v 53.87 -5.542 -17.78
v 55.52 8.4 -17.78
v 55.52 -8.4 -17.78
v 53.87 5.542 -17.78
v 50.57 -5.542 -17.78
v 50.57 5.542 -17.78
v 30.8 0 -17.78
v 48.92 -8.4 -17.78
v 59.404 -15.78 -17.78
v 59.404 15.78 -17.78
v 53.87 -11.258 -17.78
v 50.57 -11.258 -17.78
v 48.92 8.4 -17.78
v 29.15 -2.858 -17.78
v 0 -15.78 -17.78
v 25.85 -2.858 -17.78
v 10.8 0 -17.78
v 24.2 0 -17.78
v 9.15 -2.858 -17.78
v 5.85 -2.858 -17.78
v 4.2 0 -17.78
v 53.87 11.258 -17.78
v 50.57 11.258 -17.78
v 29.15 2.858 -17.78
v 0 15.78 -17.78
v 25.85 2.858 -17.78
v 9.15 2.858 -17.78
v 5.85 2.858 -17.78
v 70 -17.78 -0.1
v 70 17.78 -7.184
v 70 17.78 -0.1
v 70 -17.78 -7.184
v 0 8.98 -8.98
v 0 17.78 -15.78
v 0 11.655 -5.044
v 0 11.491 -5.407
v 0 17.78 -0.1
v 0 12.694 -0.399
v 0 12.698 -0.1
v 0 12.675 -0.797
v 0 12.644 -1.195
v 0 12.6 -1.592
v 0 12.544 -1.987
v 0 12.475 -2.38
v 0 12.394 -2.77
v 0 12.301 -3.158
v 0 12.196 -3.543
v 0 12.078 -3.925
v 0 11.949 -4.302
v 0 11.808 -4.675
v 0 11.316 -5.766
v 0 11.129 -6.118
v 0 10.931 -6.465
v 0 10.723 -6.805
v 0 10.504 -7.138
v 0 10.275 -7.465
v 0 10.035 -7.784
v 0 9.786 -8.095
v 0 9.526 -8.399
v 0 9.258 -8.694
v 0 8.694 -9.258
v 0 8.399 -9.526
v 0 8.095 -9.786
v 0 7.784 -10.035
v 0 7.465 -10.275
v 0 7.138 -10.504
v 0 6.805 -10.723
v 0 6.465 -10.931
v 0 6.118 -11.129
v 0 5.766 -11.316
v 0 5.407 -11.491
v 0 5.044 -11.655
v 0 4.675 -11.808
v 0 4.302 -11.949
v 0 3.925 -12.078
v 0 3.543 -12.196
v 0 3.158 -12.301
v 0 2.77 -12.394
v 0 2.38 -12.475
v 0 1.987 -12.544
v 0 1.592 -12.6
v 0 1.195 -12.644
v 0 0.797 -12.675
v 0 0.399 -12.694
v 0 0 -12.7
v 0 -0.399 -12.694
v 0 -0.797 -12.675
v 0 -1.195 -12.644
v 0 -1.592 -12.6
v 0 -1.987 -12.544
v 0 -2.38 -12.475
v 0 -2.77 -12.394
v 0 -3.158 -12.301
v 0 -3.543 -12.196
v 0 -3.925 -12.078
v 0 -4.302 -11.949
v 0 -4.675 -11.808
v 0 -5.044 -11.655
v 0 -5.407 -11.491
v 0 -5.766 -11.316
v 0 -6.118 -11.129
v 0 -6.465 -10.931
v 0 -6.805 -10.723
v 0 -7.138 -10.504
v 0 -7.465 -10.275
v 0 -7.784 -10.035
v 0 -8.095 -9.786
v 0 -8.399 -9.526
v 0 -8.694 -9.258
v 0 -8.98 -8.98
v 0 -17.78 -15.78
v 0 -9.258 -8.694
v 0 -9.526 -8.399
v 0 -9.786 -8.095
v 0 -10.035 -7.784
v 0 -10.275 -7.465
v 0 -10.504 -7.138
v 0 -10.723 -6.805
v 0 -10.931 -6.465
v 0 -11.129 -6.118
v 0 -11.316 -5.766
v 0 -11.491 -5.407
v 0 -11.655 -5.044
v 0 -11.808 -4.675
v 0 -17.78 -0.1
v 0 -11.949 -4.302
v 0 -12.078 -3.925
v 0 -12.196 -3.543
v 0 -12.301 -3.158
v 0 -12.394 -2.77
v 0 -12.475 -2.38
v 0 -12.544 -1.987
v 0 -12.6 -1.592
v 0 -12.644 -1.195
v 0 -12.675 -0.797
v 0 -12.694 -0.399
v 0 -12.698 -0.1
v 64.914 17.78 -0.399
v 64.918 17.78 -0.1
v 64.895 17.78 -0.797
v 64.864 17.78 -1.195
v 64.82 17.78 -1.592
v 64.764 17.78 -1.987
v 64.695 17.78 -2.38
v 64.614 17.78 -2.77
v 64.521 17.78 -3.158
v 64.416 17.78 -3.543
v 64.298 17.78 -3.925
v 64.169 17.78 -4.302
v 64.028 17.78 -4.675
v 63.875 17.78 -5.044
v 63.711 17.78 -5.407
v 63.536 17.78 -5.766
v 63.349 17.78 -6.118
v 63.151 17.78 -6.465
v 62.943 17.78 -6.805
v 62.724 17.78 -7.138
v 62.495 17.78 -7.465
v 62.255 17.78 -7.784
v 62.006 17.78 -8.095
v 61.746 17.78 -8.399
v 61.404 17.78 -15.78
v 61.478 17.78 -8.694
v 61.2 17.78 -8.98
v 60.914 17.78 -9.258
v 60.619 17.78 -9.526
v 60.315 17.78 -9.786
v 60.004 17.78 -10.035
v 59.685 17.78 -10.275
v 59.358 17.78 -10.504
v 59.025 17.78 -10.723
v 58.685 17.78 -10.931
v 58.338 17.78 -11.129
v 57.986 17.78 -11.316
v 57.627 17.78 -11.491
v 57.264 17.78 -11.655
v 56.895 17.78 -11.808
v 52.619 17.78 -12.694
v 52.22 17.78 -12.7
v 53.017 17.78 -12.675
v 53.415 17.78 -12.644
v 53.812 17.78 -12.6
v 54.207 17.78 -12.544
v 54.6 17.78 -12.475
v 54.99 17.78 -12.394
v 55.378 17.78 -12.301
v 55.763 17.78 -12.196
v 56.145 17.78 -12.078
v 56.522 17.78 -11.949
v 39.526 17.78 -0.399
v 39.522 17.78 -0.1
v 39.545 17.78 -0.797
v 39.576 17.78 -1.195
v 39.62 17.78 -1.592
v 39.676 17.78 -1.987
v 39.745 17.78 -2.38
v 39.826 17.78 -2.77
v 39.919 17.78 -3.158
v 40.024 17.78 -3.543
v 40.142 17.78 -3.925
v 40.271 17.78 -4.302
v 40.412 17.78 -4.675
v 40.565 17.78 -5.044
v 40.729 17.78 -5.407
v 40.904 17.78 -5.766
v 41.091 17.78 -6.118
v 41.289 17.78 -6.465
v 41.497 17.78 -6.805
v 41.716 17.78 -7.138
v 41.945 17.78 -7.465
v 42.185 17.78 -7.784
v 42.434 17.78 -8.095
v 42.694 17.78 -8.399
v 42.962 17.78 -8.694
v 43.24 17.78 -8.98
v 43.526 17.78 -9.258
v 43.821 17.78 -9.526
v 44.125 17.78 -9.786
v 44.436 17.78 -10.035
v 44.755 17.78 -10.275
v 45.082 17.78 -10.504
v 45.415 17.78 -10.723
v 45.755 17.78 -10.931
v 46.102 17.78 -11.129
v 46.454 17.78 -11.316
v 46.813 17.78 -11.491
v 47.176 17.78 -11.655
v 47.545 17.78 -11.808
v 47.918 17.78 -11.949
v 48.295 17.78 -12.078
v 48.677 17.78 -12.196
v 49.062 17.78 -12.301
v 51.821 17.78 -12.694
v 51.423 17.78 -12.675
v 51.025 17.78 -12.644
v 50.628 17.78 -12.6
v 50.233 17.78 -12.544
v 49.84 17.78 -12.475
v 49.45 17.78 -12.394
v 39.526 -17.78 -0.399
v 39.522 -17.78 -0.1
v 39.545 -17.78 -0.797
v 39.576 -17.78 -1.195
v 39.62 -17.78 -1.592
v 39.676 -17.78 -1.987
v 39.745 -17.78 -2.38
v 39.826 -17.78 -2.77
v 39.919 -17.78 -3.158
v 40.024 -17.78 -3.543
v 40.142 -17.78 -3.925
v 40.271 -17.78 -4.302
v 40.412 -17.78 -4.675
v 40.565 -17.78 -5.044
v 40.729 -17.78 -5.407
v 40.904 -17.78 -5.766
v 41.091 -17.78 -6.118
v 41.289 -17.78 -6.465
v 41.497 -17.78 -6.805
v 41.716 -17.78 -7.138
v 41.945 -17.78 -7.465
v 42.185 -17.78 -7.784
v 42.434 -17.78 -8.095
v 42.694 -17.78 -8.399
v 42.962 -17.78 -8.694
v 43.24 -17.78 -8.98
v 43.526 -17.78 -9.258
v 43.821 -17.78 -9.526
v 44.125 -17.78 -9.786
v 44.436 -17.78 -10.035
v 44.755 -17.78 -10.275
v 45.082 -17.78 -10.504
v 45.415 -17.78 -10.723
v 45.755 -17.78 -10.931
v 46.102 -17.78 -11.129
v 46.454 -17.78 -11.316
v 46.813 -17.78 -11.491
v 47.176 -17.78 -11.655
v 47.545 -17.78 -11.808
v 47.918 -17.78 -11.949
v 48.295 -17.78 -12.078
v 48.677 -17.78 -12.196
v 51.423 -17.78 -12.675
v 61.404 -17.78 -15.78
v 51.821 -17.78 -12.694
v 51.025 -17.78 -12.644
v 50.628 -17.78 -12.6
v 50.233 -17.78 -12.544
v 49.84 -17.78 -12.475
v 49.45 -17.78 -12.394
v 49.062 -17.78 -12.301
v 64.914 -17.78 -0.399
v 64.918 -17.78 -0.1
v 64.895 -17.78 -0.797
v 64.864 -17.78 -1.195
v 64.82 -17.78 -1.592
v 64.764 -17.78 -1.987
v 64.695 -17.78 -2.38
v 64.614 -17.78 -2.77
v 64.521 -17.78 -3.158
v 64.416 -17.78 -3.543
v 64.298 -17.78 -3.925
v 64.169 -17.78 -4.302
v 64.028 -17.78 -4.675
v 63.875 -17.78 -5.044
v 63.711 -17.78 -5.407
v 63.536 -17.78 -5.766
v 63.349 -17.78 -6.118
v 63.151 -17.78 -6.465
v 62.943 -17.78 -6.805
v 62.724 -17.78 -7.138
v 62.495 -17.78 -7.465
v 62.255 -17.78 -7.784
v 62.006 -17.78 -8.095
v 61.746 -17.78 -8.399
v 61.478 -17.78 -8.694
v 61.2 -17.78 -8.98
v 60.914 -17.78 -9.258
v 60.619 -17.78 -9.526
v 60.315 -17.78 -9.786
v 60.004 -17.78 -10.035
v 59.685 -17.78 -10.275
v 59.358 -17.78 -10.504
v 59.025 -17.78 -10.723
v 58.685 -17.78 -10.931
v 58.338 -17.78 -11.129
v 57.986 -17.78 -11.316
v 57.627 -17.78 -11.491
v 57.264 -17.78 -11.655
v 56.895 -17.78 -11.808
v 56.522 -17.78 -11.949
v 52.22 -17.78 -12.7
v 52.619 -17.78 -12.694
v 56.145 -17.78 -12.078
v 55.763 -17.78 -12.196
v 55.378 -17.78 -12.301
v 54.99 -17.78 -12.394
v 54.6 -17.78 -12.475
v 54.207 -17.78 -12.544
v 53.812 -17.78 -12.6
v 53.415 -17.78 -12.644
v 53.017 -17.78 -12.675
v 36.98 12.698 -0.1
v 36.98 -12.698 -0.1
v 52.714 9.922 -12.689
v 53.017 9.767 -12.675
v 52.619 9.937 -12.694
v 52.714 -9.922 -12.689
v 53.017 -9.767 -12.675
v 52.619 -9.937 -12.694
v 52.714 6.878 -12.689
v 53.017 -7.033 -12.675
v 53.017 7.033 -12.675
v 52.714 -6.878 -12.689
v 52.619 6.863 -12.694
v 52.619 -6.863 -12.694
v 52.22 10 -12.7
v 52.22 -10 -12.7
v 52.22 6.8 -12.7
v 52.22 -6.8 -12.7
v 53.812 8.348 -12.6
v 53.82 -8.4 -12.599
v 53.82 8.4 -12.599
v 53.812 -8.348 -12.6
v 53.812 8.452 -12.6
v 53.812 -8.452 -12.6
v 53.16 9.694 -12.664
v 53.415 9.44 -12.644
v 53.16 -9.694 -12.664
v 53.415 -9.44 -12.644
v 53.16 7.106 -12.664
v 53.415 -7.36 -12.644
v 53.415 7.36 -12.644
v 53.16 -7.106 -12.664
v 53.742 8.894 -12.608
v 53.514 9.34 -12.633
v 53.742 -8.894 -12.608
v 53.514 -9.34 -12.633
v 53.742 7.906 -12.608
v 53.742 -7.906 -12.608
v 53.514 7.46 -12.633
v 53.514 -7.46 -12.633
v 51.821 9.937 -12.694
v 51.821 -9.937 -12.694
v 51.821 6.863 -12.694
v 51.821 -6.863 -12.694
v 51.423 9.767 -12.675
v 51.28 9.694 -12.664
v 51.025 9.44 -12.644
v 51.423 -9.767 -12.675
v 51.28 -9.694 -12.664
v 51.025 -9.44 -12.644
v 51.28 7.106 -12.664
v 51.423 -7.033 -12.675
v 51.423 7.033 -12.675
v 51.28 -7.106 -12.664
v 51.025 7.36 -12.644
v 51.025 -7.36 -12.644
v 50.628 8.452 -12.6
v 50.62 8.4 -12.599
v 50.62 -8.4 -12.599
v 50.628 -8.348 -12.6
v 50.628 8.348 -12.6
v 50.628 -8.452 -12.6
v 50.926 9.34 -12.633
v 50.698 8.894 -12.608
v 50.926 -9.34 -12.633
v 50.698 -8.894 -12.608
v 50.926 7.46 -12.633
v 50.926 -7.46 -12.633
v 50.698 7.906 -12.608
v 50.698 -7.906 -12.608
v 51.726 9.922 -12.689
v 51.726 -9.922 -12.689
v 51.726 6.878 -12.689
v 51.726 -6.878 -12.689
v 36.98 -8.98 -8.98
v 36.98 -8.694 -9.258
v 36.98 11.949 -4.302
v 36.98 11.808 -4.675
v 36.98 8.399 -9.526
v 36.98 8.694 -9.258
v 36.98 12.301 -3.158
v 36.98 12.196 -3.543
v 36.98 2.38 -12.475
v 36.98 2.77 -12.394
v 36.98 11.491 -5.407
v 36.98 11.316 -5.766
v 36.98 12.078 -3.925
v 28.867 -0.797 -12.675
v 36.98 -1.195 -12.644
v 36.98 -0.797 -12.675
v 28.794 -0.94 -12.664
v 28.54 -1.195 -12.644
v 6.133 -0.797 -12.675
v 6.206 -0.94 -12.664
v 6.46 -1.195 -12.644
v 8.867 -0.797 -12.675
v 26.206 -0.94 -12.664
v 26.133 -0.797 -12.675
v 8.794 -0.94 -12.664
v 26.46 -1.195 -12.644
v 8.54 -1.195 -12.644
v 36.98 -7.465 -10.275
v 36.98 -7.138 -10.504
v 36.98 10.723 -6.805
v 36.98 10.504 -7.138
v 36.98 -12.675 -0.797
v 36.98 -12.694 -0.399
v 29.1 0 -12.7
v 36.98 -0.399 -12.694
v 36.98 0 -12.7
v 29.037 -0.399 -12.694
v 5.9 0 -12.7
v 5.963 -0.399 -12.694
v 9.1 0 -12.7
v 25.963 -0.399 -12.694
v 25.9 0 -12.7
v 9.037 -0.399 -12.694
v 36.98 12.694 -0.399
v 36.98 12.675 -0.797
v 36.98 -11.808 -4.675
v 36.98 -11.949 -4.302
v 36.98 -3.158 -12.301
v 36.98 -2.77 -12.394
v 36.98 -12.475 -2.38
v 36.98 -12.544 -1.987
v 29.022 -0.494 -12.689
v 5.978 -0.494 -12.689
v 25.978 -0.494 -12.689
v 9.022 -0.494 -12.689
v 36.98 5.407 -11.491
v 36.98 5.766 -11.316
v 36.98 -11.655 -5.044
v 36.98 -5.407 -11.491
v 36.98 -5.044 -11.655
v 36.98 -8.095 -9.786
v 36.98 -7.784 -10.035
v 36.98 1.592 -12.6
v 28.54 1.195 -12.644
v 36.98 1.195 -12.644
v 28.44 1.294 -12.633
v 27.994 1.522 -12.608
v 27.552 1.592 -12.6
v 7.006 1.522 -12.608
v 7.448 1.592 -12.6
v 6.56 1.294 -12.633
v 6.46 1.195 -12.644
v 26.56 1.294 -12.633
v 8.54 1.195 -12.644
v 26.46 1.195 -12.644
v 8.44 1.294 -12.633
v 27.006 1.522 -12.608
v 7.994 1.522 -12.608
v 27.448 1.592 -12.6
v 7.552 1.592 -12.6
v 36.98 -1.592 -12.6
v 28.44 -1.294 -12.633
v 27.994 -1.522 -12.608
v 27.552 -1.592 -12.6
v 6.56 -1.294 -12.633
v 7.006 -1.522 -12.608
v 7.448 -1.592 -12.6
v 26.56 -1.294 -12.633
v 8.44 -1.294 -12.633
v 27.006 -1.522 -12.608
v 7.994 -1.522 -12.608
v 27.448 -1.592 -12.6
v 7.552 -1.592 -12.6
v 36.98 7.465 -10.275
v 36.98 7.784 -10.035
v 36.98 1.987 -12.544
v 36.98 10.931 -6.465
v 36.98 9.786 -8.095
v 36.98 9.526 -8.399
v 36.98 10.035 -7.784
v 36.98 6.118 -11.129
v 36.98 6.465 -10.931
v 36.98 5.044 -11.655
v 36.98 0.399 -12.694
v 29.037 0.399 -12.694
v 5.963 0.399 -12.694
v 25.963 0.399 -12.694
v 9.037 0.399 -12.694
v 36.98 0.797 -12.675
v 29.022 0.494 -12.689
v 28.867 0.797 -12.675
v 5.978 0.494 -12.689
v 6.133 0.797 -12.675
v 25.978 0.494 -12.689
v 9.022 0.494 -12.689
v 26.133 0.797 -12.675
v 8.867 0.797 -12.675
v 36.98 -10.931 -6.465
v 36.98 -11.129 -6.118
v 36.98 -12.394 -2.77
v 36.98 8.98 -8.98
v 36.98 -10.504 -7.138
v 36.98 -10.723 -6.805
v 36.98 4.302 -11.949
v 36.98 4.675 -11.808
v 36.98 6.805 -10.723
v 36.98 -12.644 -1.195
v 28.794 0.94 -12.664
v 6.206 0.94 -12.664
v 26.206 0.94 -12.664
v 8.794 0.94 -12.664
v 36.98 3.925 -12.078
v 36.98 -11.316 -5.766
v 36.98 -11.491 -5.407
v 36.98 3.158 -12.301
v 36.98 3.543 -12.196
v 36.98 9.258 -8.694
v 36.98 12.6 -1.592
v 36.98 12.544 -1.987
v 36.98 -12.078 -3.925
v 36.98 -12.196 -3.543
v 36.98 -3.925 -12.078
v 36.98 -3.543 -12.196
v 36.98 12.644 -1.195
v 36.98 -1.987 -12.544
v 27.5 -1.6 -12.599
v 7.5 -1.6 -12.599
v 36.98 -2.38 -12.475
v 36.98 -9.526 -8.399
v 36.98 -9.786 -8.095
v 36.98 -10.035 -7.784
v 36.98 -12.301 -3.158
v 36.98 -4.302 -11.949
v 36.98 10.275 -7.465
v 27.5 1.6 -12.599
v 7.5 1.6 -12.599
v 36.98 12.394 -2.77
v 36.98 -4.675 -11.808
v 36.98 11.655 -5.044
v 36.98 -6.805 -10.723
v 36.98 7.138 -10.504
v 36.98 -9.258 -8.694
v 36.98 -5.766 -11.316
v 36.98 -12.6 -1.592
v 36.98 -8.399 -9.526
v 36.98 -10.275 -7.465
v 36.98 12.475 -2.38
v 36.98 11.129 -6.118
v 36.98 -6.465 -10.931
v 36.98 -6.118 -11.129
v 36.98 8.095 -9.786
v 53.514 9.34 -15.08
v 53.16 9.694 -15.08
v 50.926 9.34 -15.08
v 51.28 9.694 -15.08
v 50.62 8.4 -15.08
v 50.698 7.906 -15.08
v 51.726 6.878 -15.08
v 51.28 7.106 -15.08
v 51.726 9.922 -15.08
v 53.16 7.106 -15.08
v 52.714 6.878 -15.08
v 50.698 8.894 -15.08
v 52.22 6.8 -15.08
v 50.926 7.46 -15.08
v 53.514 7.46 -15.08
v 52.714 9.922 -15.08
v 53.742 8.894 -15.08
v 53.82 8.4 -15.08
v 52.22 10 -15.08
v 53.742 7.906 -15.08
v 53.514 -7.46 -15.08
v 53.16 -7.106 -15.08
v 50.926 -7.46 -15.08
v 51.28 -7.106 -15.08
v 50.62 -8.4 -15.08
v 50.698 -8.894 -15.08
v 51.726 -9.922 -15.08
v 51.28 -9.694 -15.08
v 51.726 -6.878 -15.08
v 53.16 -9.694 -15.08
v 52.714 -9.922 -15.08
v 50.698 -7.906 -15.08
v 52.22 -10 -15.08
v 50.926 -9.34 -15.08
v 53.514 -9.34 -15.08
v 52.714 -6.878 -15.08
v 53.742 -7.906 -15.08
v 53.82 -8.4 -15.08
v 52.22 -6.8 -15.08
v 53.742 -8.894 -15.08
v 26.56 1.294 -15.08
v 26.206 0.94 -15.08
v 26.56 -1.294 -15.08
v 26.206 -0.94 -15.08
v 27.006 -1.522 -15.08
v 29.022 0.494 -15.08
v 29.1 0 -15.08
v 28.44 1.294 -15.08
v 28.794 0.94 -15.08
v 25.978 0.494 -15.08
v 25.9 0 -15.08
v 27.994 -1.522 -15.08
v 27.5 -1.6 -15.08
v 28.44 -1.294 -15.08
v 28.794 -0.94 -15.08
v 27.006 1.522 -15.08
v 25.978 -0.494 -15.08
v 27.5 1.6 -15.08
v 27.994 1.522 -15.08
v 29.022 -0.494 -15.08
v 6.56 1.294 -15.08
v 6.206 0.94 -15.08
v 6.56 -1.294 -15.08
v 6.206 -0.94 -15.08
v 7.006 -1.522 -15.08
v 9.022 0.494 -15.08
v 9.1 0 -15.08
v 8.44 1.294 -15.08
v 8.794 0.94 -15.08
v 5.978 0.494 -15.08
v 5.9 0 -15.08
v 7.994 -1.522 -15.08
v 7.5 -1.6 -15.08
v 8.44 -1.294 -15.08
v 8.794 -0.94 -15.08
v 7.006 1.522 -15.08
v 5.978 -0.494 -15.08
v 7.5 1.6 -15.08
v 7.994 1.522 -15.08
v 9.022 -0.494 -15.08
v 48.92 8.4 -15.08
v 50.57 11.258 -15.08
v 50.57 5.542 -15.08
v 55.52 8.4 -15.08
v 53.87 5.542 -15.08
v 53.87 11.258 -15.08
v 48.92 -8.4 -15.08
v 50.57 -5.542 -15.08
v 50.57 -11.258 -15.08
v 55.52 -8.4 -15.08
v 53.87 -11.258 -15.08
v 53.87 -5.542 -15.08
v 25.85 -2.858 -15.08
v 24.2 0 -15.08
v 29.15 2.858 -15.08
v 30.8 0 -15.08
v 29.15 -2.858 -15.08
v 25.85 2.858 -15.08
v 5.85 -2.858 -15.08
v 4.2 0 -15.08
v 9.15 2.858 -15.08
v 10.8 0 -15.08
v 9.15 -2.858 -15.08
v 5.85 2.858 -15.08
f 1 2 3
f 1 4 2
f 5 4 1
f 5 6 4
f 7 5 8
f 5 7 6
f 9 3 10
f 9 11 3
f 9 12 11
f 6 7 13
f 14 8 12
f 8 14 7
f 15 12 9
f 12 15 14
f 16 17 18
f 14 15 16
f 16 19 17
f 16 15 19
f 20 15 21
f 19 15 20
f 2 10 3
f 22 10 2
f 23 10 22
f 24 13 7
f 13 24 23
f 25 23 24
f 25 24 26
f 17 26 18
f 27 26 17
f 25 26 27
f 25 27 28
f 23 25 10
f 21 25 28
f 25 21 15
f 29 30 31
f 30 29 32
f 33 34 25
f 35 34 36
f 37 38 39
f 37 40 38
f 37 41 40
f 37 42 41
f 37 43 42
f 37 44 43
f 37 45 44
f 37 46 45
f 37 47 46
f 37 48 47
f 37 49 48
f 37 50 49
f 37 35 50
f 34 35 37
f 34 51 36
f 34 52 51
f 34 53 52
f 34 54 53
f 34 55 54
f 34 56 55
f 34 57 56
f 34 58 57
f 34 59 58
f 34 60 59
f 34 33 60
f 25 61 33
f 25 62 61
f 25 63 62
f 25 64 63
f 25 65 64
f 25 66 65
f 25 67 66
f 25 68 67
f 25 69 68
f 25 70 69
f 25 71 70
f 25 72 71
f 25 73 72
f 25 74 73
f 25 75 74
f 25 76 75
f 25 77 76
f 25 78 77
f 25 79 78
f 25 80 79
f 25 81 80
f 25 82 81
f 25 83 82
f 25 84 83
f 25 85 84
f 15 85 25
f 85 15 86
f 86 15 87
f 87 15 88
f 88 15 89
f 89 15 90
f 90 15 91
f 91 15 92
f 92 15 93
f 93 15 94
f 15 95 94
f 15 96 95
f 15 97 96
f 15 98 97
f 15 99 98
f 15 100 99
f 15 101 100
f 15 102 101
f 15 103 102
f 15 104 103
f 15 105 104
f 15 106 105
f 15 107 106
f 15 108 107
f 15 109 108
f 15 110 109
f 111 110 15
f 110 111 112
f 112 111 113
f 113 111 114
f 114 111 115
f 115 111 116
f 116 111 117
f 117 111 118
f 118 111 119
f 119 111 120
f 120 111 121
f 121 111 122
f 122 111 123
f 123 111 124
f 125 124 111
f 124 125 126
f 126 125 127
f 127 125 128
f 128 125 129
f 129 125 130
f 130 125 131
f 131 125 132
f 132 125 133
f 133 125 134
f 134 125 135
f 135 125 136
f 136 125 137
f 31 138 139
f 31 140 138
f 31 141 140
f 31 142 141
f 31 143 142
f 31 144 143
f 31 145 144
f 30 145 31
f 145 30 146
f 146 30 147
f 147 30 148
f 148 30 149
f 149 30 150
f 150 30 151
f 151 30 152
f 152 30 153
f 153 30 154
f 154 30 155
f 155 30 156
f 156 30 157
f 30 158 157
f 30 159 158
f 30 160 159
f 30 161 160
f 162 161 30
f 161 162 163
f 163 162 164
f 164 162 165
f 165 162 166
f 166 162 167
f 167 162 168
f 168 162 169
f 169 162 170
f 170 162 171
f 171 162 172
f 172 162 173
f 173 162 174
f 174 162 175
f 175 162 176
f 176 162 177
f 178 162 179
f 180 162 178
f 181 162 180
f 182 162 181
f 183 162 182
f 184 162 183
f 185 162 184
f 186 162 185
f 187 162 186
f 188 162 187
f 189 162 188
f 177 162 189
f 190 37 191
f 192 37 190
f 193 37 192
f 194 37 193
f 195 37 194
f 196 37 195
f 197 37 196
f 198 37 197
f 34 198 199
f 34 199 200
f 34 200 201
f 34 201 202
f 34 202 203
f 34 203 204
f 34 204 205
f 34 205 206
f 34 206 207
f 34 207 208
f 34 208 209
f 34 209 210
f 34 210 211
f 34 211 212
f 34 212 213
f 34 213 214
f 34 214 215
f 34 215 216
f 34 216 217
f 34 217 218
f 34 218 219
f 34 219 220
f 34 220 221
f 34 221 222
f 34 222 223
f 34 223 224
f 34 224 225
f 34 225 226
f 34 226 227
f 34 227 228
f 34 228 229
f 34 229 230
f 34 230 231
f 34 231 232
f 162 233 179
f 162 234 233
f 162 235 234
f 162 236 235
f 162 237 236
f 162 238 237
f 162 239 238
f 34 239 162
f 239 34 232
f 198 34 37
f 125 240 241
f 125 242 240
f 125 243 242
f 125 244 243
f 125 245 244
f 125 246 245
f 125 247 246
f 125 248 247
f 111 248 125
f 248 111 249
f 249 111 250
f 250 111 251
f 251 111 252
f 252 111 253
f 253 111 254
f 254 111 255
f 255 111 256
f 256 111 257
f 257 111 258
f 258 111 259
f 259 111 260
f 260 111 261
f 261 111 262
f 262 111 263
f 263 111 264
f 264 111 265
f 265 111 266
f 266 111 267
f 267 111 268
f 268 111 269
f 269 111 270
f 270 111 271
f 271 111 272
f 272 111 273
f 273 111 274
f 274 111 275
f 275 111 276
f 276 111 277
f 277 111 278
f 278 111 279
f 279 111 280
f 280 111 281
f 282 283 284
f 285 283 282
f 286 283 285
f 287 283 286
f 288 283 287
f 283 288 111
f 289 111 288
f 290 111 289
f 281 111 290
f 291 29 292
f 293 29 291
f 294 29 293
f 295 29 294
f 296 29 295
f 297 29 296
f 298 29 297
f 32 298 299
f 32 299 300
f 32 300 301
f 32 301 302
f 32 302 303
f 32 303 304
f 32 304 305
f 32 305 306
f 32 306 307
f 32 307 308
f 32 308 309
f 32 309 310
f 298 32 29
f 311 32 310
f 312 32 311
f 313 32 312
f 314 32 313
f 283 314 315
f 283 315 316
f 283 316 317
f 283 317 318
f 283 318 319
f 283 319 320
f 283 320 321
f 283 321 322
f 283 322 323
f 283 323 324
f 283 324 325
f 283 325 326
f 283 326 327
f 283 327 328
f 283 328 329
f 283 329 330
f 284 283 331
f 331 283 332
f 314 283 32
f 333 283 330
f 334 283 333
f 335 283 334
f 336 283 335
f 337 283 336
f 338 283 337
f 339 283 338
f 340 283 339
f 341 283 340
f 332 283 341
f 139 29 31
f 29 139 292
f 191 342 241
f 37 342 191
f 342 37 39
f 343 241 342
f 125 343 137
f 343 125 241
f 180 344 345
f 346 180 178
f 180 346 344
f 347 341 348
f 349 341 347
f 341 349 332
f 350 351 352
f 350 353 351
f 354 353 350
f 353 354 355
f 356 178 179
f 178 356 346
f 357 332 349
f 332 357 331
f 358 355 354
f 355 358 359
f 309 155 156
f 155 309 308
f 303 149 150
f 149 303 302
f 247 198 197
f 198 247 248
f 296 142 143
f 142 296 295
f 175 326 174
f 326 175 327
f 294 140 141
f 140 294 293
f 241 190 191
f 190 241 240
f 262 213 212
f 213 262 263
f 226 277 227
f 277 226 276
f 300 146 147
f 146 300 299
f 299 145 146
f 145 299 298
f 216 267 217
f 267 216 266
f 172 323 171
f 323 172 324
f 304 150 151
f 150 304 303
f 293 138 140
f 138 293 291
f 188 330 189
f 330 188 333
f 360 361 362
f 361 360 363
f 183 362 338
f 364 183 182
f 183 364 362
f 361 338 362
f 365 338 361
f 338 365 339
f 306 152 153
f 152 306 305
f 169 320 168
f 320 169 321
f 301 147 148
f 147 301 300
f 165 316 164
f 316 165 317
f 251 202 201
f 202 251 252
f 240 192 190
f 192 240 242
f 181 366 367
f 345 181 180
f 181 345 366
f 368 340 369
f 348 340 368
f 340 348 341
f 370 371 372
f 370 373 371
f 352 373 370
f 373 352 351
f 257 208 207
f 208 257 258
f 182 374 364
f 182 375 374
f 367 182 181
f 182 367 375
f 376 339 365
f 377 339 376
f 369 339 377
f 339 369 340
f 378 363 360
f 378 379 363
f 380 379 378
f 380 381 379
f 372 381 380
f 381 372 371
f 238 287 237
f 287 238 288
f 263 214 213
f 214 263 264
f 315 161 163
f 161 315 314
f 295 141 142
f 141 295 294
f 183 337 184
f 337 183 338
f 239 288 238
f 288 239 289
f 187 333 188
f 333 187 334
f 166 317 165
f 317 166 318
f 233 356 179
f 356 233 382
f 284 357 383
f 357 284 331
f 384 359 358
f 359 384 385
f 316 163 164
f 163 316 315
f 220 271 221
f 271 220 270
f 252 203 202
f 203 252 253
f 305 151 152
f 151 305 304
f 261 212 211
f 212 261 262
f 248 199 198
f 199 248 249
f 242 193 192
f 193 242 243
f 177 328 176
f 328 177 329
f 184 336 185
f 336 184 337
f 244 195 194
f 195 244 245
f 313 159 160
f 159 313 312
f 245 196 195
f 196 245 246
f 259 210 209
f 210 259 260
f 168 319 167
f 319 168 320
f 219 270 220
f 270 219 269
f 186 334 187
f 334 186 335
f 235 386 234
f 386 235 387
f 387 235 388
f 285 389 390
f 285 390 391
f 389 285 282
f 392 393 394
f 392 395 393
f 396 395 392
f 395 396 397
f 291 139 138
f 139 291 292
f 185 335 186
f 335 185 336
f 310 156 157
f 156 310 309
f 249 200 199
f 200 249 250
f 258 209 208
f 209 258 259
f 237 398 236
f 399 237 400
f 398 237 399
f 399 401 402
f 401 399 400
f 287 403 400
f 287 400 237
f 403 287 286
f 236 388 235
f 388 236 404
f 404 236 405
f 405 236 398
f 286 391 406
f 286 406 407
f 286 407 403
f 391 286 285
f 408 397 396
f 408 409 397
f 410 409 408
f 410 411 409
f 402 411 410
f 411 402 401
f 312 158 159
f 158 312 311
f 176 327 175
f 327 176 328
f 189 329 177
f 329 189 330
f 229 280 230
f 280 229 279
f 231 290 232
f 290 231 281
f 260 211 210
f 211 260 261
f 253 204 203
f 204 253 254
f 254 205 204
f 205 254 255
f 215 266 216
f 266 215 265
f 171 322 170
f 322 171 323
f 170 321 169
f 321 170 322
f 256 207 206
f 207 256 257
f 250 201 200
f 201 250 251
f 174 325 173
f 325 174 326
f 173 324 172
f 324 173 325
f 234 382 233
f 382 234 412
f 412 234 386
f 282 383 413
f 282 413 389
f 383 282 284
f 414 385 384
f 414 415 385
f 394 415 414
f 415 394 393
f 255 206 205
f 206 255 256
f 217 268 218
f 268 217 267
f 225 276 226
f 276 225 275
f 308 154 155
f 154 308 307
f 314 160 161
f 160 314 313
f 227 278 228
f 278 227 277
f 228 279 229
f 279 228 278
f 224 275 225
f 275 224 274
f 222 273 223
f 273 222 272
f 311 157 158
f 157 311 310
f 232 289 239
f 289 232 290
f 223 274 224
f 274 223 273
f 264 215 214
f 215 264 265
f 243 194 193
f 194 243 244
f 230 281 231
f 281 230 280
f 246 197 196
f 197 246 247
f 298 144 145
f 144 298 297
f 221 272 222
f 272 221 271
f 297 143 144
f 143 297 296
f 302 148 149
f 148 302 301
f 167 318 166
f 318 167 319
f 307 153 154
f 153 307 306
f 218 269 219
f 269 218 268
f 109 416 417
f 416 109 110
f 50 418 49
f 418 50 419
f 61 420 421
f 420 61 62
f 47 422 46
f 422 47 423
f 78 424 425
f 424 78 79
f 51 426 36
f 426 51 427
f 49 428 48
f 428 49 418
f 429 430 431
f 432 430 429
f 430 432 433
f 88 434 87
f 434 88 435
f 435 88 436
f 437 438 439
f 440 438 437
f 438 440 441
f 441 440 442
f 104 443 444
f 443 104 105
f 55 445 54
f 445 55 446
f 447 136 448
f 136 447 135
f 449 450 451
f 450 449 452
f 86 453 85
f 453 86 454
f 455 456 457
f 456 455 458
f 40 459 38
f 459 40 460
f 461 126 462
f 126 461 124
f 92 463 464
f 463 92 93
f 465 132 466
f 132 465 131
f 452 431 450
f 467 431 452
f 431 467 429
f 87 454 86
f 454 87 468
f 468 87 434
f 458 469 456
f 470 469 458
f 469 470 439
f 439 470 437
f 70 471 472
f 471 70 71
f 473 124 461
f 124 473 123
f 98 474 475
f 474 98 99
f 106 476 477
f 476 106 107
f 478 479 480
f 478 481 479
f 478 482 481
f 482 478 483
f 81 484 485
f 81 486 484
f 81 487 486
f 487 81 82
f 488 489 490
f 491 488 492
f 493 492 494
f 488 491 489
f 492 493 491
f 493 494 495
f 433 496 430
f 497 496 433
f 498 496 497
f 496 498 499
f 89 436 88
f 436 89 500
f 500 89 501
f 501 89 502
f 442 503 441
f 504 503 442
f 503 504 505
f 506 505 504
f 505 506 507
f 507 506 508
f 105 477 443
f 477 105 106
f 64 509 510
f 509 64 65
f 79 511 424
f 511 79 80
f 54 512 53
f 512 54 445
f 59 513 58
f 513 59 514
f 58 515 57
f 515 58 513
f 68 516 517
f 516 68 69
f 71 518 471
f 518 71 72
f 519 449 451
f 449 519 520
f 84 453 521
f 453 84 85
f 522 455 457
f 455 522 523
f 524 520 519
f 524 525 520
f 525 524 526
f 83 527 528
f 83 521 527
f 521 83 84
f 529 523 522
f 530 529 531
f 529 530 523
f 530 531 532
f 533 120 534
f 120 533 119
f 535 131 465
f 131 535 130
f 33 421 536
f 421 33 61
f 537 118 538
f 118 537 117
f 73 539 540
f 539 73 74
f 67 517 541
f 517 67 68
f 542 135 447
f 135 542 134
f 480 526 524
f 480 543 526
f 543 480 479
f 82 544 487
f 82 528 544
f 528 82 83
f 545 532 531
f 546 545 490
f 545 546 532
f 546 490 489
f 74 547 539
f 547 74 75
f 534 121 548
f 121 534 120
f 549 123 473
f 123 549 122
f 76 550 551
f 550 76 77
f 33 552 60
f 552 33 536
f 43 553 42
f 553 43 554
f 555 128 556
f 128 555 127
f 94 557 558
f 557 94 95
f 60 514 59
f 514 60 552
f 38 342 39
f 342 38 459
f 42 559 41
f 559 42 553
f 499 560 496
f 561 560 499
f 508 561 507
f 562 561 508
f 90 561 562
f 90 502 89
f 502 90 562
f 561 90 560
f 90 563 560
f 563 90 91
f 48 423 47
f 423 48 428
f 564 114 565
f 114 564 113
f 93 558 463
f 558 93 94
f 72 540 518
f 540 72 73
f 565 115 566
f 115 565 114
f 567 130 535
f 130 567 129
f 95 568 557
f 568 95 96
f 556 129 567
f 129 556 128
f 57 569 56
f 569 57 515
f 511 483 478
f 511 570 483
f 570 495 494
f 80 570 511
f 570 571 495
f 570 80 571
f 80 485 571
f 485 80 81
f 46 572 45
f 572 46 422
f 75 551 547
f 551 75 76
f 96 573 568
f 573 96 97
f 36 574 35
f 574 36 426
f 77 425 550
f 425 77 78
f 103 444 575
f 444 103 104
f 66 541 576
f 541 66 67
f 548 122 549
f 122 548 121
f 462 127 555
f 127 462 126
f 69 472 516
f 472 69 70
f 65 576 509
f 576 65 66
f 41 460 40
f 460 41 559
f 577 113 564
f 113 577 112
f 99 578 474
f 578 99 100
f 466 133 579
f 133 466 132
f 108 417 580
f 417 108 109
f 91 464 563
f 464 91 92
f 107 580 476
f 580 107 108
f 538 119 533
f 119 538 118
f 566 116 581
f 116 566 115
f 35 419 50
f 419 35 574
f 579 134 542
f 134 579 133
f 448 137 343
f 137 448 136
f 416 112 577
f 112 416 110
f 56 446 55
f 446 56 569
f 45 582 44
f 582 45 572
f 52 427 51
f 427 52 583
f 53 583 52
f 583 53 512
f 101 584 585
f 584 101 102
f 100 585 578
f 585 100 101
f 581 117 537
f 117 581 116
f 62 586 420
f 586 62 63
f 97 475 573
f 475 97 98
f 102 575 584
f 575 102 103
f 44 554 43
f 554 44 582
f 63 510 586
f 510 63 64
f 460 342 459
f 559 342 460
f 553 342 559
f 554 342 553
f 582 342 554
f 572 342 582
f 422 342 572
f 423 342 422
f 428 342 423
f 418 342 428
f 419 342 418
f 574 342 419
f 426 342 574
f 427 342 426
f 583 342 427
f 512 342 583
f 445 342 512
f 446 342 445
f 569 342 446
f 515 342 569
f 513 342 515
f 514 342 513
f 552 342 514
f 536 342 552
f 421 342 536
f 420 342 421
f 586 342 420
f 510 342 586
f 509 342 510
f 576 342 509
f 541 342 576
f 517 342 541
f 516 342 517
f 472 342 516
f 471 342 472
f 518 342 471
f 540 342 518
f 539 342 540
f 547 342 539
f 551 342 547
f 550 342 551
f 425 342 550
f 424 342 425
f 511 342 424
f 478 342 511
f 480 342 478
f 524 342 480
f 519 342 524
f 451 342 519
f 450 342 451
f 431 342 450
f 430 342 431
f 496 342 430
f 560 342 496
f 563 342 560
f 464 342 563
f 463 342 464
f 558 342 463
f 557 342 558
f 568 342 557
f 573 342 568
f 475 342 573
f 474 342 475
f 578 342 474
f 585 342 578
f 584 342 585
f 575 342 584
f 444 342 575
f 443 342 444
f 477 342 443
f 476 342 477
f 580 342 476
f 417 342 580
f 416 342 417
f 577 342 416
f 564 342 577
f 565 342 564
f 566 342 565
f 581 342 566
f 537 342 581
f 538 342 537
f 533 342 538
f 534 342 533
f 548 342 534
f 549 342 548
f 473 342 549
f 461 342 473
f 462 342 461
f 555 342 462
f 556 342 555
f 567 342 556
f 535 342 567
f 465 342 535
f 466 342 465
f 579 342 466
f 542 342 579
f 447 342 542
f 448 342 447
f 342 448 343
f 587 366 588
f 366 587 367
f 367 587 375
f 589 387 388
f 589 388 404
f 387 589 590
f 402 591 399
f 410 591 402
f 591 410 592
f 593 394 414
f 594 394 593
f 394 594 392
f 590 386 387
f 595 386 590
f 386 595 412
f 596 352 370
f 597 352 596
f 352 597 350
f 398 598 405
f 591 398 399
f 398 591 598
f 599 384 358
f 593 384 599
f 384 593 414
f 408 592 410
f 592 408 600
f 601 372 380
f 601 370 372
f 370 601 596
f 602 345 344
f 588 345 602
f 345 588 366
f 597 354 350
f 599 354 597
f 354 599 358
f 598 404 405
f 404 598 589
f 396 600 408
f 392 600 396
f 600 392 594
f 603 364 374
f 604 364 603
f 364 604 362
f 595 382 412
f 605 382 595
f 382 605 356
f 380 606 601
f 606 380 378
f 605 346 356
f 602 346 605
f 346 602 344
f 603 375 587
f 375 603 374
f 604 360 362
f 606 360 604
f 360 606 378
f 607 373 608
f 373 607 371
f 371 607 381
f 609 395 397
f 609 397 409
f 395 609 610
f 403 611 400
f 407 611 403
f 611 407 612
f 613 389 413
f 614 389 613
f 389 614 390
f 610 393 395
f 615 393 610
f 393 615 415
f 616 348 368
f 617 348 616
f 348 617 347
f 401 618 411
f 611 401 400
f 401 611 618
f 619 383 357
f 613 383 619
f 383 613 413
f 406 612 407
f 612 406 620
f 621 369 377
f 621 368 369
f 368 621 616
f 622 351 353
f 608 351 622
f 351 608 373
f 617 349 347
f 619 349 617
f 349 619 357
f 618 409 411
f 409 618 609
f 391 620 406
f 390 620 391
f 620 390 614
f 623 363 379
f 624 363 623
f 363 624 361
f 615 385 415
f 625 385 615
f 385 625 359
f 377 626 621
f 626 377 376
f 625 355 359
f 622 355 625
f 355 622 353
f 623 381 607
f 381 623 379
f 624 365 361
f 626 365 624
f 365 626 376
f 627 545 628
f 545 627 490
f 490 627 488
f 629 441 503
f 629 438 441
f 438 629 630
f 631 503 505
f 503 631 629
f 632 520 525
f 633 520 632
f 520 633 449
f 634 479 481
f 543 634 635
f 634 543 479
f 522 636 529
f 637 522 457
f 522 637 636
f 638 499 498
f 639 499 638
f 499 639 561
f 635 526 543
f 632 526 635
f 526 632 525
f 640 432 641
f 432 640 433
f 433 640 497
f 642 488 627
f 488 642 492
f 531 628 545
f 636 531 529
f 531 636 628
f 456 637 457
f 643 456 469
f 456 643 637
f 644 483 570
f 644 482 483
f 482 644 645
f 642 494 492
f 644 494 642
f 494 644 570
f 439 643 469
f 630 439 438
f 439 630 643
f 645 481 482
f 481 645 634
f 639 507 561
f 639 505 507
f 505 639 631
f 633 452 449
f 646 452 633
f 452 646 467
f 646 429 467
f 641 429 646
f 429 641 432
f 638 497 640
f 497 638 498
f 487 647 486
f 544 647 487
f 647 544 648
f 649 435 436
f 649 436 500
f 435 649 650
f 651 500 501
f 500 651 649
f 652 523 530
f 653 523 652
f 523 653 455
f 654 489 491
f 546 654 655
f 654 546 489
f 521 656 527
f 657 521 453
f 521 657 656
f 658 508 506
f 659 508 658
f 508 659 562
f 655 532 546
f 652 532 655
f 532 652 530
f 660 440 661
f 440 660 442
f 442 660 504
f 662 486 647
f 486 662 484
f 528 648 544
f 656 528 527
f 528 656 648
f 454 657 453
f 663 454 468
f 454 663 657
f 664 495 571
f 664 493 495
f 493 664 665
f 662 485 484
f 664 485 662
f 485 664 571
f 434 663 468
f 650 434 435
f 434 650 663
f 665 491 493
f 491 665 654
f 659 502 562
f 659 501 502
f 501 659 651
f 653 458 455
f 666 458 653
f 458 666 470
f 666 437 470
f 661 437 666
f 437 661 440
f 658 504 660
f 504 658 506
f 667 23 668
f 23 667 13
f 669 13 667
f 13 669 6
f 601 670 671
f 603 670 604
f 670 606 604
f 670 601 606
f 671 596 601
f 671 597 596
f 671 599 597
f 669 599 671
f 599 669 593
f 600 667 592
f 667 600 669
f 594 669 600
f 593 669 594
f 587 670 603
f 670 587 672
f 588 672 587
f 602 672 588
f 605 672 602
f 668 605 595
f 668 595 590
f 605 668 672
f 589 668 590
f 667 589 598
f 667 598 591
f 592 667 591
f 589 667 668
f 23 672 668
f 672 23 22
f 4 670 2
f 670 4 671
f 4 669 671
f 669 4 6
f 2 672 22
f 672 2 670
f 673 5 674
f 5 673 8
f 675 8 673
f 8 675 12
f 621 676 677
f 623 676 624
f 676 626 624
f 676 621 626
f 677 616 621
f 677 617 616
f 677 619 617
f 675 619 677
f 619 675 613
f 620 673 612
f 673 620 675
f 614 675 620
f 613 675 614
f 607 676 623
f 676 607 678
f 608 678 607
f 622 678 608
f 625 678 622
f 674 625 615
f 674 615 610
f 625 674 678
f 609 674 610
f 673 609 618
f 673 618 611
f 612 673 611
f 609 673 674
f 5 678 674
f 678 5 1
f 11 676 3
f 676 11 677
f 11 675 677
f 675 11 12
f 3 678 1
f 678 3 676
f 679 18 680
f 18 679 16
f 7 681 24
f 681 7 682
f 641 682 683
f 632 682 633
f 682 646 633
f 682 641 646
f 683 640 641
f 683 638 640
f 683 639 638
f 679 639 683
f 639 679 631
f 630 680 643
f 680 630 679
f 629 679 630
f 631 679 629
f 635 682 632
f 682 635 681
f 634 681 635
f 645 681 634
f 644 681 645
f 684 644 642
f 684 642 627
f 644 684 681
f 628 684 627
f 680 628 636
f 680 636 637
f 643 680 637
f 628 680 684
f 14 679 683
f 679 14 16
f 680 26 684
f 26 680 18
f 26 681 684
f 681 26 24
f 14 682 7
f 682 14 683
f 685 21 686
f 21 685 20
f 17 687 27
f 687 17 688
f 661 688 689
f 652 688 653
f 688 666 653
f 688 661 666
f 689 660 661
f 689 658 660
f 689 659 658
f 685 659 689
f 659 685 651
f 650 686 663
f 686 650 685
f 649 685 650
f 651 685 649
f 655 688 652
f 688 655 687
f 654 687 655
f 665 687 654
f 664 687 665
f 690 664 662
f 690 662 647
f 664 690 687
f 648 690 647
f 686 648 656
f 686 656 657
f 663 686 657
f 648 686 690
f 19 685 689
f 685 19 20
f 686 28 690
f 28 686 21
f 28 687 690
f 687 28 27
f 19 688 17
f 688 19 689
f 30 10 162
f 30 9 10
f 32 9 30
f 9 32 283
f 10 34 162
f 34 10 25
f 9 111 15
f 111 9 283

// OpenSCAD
// file: ../666_1017.scad
//improving rendering speed.
draft = true;   // sets rendering quality to draft.
$fs = draft ? 5 : 0.5;
$fa = 10;

module 666_1017(draft) {

width=main_tube_outer_diameter+2*coupling_wall_thickness;
depth=width;
height= 70; //main_tube_outer_diameter*1.8+main_tube_outer_diameter+wall_thickness;


difference () {
	translate([-(width/2),-(width/2),0])
	   cube ([width,depth,height]);

    //middle cut
    translate ([-0.1,-depth/2 - global_clearance/2,- global_clearance/2])
        cube ([0.2,depth + global_clearance,height + global_clearance]);

	//main tube
	translate([0,main_tube_outer_diameter/2 + coupling_wall_thickness + global_clearance/2, height - main_tube_outer_diameter/2 - coupling_wall_thickness])   
        rotate([90,0,0])
            cylinder(h = depth + global_clearance, r = main_tube_outer_diameter/2, $fn = draft ? 100 : 200);

    //vertical tube
    translate ([0,0, - thickness_between_tubes])
        cylinder(h = height - coupling_wall_thickness - main_tube_outer_diameter,r = main_tube_outer_diameter/2, $fn = draft ? 100 : 200);

   			

   	//screws
   	translate ([- width/2 - global_clearance/2,10 - M3_screw_diameter/2,height - coupling_wall_thickness - main_tube_outer_diameter/2])
   	    rotate ([0,90,0])
            cylinder (h = width + global_clearance, r = M3_screw_diameter/2, $fn = draft ? 10 : 20);

 	translate([- width/2 - global_clearance/2,- 10 + M3_screw_diameter/2,height - coupling_wall_thickness - main_tube_outer_diameter/2])
     	rotate([0,90,0])
            cylinder(h = width + global_clearance, r = M3_screw_diameter/2, $fn = draft ? 10 : 20);

 	translate([- width/2 - global_clearance/2,0,27.5])
        rotate([0,90,0])
            cylinder(h = width + global_clearance, r = M3_screw_diameter/2, $fn = draft ? 10 : 20);

 	translate([- width/2 - global_clearance/2,0,7.5])
        rotate([0,90,0])
            cylinder(h = width + global_clearance, r = M3_screw_diameter/2, $fn = draft ? 10 : 20);

 	//nut
 	translate ([- width/2 - global_clearance,10 - M3_screw_diameter/2,height- coupling_wall_thickness - main_tube_outer_diameter/2])
   	    rotate ([0,90,0])
            cylinder (h = Nut_height_M3 + global_clearance, r = Nut_diameter_M3/2, $fn = 6);
	
	translate([- width/2 - global_clearance,- 10 + M3_screw_diameter/2,height- coupling_wall_thickness - main_tube_outer_diameter/2])
        rotate([0,90,0])
            cylinder (h = Nut_height_M3 + global_clearance, r = Nut_diameter_M3/2, $fn = 6);

	translate ([width/2 - Nut_height_M3,10 - M3_screw_diameter/2,height- coupling_wall_thickness - main_tube_outer_diameter/2])
   	    rotate ([0,90,0])
            cylinder (h = Nut_height_M3 + global_clearance, r = Nut_diameter_M3/2, $fn = 6);
	
	translate([width/2 - Nut_height_M3,- 10 + M3_screw_diameter/2,height- coupling_wall_thickness - main_tube_outer_diameter/2])
        rotate([0,90,0])
            cylinder (h = Nut_height_M3 + global_clearance, r = Nut_diameter_M3/2, $fn = 6);

 	translate([- width/2 - global_clearance,0,27.5])
        rotate ([0,90,0])
            cylinder (h = Nut_height_M3 + global_clearance, r = Nut_diameter_M3/2, $fn = 6);

 	translate([- width/2 - global_clearance,0,7.5])
        rotate ([0,90,0])
            cylinder (h = Nut_height_M3 + global_clearance, r = Nut_diameter_M3/2, $fn = 6);

 	translate([width/2 - Nut_height_M3,0,27.5])
        rotate ([0,90,0])
            cylinder (h = Nut_height_M3 + global_clearance, r = Nut_diameter_M3/2, $fn = 6);

 	translate([width/2 - Nut_height_M3,0,7.5])
        rotate ([0,90,0])
            cylinder (h = Nut_height_M3 + global_clearance, r = Nut_diameter_M3/2, $fn = 6);

    //horizontal bevelled edge
        translate([0,-(depth/2) - global_clearance/2,height+sqrt(2)*coupling_wall_thickness])
            rotate([0,45,0])
                cube([width,width + global_clearance,width]);

    mirror([1,0,0])
        translate([0,-(depth/2) - global_clearance/2,height+sqrt(2)*coupling_wall_thickness])
            rotate([0,45,0])
                cube([width,width + global_clearance,width]);

    //vertical bevelled edge

        translate([-width + 2,0,- global_clearance/2])
            rotate([0,0,45])
                cube([height,height,height + global_clearance]);

    mirror([1,0,0])
        translate([-width + 2,0,- global_clearance/2])
            rotate([0,0,45])
                cube([height,height,height + global_clearance]);

    mirror([0,1,0])
        translate([-width + 2,0,- global_clearance/2])
            rotate([0,0,45])
                cube([height,height,height + global_clearance]);

    mirror([0,1,0])
        mirror([1,0,0])
            translate([-width + 2,0,- global_clearance/2])
                rotate([0,0,45])
                    cube([height,height,height + global_clearance]);
    }    
}

module 666_1017_drillhelper(height = 70 - coupling_wall_thickness + main_tube_outer_diameter/2, height_of_cap_cylinder = 2){

width=main_tube_outer_diameter+4*thickness_between_tubes;
depth=main_tube_outer_diameter*2;



difference () {

    translate([-(width/2),-(depth/2),0])
    color([1,0,0])
       cube ([width,depth,height]);


    //main tube
    translate([0,main_tube_outer_diameter + coupling_wall_thickness + global_clearance/2, height - main_tube_outer_diameter/2 - main_tube_outer_diameter/2])   
        rotate([90,0,0])
            cylinder(h = main_tube_outer_diameter*3 + global_clearance, r = main_tube_outer_diameter/2, $fn = draft ? 100 : 200);

    //vertical tube
    translate ([0,0, - thickness_between_tubes])
        cylinder(h = height - main_tube_outer_diameter/2 - main_tube_outer_diameter,r = main_tube_outer_diameter/2, $fn = draft ? 100 : 200);

            

    //screws
    translate ([- width/2 - global_clearance/2,10 - M3_screw_diameter/2,height - main_tube_outer_diameter/2 - main_tube_outer_diameter/2])
        rotate ([0,90,0])
            cylinder (h = width + global_clearance, r = M3_screw_diameter/2, $fn = draft ? 10 : 20);

    translate([- width/2 - global_clearance/2,- 10 + M3_screw_diameter/2,height - main_tube_outer_diameter/2 - main_tube_outer_diameter/2])
        rotate([0,90,0])
            cylinder(h = width + global_clearance, r = M3_screw_diameter/2, $fn = draft ? 10 : 20);

    translate([- width/2 - global_clearance/2,0,27.5])
        rotate([0,90,0])
            cylinder(h = width + global_clearance, r = M3_screw_diameter/2, $fn = draft ? 10 : 20);

    translate([- width/2 - global_clearance/2,0,7.5])
        rotate([0,90,0])
            cylinder(h = width + global_clearance, r = M3_screw_diameter/2, $fn = draft ? 10 : 20);


    }

}





//rotate([90,0,0])
    666_1017(draft);

translate([70,0,0])
666_1017_drillhelper();

include <../Parameters.scad>
// file: ../../Parameters.scad
//Main tube diameter - hole [mm]
main_tube_outer_diameter = 25.4;
main_tube_inner_diameter = 23.5;

//Tube for undercarriage - hole [mm]
tube_for_undercarriage_outer_diameter = 10.6;
tube_for_undercarriage_inner_diameter = 6;
global_clearance = 0.5;


//umístění podvozkových trubek

second_undercarriage_hole = main_tube_outer_diameter*2 + main_tube_outer_diameter/5 + main_tube_outer_diameter/2 + 170 + 160;

// Parameters of tube couplings
coupling_wall_thickness = main_tube_outer_diameter/5;  //width of coupling walls 
thickness_between_tubes = main_tube_outer_diameter/10;    // minimum distance between tubes in couplings

coupling_wall_thickness_undercarriage = tube_for_undercarriage_outer_diameter/3;
thickness_between_tubes_undercarriage = tube_for_undercarriage_outer_diameter/10;

//Screw diameter and nut for M4 [mm]
M4_screw_diameter=4.5;
Nut_height_M4 = 3.2;
Nut_diameter_M4 = 7.86;


//Screw diameter and nut for M3 [mm]
M3_screw_diameter = 3.2;
Nut_height_M3 = 2.7;	
Nut_diameter_M3 = 6.6; 


//The tube for help
Help_main_tube_outer = 25;
Help_main_tube_inner = 23; 
Help_tube_for_undercarriage_outer = 10;
Help_tube_for_undercarriage_inner = 5;


//main hull parameters

hull_drop_length = 580;
hull_wall_thickness = 0.8;
hull_y_size = 120;
hull_z_size = 150;
hull_x_size = 580;
hull_corner_radius = 4;
hull_airfoil_thickness= 35;  // thickness of drop generating airfoil in percent of lenght.
hull_scale_x = 1;
hull_scale_y = 1.5;
hull_scale_z = 1.5;

main_pilon_position = 170+68;
cover_pilon_position = 180;
height_of_vertical_tube = 275; //278mm je změřená délka trubky. 

//délka hlavní dlouhé trubky
length_of_main_tube = 920;
length_of_undercarriage_tube = 300;

ribbon_width = 5; // šířka vyztužovacích lemů. 

// šířka otvoru v přední části kapoty pro držák motoru.
width_of_engine_holder = 63;

//Top Cover Division - dělení horního krytu pro tisk
top_cover_division = [0, 50, 150, 280, 410, hull_x_size]; // upraveny seznam tak, aby deleni začinalo od nuly, což umožňí úplně automatické rozdělení.

//Bottom Cover Division - dělení dolního krytu pro tisk
bottom_cover_division = [0,100,232.5,365, 470, hull_x_size];
// zkrácená část pro payload pro testovací tisk
//bottom_cover_division = [0,200,250,365, 470, hull_x_size];

//Base Divison - dělení podložky
base_division = [0, 140, main_pilon_position - (3*main_tube_outer_diameter)/2 + 3 * main_tube_outer_diameter,second_undercarriage_hole - main_tube_outer_diameter/2 - coupling_wall_thickness + main_tube_outer_diameter+2*(main_tube_outer_diameter/5) + global_clearance, hull_x_size];

//Cover pilon division - na výšku (v ose Z)
cover_pilon_division = [0,170,height_of_vertical_tube + main_tube_outer_diameter + coupling_wall_thickness];

//pozice šroubů
	//horní kryt
top_screw_position = [0, (top_cover_division[0] + top_cover_division[1])/4, (top_cover_division[2] - top_cover_division[1])/2 + top_cover_division[1], (top_cover_division[3] - top_cover_division[2])/2 + top_cover_division[2],(top_cover_division[4] - top_cover_division[3])/8 + top_cover_division[3],(top_cover_division[5] - top_cover_division[4])/2 + top_cover_division[4] - 20];
	//spodní kryt
bottom_screw_position = [0,(bottom_cover_division[0] + bottom_cover_division[1])/15 + 5, bottom_cover_division[1]/1.1, + bottom_cover_division[3], bottom_cover_division[3] + bottom_cover_division[1]/1.5];




//šířka zámků
lock_width = 10;

//délka zámků
lock_length = 3;


//accumulator
//základní rozměry akumulátoru
width_of_accumulator = 129.4;//45+1;
depth_of_accumulator = 40.61;
height_of_accumulator = 43.65;
//Zapuštění akumulátoru
sink_of_accumulator = 5; //main_tube_outer_diameter/5 - Nut_height_M3*1.5;

//tloušťka hrany spojky
accumulator_holder_width = 18; 
accumulator_holder_thickness = 10; 

//posunutí akumálátoru na podložce
move_of_accumulator = 165;   // pozice akumulátoru (ovlivňuje těžiště)


////////////////
// Senzory
///////////////////

//opticalFlow
    width_optical_flow_senzor = 45.5;
    depth_optical_flow_senzor = 6;
    height_optical_flow_senzor = 35;
    sink_of_optical_flow_senzor = depth_optical_flow_senzor - 5; 
    M3_optical_flow_senzor_Z = 30.4;
    M3_optical_flow_senzor_X = 24;
    M3_optical_flow_senzor_Z_alone = 9.1;
    M3_optical_flow_senzor_X_alone = 16.7;

//GPS anténa
GPS_outer_length = 48.01;   //Vnější rozměr
GPS_inner_length = 37.48;   //Vnitřní rozměr
GPS_diameter = (GPS_outer_length - GPS_inner_length)/2;    //Průměr otvoru
GPS_middle_length = GPS_diameter + GPS_inner_length;      //Střední rozměr
// main file
include <../../Parameters.scad>

use <../666_1017.scad>

difference(){
    rotate([0,90,0])
        666_1017();
    translate([-50,-50,0])
        cube(150);
}
